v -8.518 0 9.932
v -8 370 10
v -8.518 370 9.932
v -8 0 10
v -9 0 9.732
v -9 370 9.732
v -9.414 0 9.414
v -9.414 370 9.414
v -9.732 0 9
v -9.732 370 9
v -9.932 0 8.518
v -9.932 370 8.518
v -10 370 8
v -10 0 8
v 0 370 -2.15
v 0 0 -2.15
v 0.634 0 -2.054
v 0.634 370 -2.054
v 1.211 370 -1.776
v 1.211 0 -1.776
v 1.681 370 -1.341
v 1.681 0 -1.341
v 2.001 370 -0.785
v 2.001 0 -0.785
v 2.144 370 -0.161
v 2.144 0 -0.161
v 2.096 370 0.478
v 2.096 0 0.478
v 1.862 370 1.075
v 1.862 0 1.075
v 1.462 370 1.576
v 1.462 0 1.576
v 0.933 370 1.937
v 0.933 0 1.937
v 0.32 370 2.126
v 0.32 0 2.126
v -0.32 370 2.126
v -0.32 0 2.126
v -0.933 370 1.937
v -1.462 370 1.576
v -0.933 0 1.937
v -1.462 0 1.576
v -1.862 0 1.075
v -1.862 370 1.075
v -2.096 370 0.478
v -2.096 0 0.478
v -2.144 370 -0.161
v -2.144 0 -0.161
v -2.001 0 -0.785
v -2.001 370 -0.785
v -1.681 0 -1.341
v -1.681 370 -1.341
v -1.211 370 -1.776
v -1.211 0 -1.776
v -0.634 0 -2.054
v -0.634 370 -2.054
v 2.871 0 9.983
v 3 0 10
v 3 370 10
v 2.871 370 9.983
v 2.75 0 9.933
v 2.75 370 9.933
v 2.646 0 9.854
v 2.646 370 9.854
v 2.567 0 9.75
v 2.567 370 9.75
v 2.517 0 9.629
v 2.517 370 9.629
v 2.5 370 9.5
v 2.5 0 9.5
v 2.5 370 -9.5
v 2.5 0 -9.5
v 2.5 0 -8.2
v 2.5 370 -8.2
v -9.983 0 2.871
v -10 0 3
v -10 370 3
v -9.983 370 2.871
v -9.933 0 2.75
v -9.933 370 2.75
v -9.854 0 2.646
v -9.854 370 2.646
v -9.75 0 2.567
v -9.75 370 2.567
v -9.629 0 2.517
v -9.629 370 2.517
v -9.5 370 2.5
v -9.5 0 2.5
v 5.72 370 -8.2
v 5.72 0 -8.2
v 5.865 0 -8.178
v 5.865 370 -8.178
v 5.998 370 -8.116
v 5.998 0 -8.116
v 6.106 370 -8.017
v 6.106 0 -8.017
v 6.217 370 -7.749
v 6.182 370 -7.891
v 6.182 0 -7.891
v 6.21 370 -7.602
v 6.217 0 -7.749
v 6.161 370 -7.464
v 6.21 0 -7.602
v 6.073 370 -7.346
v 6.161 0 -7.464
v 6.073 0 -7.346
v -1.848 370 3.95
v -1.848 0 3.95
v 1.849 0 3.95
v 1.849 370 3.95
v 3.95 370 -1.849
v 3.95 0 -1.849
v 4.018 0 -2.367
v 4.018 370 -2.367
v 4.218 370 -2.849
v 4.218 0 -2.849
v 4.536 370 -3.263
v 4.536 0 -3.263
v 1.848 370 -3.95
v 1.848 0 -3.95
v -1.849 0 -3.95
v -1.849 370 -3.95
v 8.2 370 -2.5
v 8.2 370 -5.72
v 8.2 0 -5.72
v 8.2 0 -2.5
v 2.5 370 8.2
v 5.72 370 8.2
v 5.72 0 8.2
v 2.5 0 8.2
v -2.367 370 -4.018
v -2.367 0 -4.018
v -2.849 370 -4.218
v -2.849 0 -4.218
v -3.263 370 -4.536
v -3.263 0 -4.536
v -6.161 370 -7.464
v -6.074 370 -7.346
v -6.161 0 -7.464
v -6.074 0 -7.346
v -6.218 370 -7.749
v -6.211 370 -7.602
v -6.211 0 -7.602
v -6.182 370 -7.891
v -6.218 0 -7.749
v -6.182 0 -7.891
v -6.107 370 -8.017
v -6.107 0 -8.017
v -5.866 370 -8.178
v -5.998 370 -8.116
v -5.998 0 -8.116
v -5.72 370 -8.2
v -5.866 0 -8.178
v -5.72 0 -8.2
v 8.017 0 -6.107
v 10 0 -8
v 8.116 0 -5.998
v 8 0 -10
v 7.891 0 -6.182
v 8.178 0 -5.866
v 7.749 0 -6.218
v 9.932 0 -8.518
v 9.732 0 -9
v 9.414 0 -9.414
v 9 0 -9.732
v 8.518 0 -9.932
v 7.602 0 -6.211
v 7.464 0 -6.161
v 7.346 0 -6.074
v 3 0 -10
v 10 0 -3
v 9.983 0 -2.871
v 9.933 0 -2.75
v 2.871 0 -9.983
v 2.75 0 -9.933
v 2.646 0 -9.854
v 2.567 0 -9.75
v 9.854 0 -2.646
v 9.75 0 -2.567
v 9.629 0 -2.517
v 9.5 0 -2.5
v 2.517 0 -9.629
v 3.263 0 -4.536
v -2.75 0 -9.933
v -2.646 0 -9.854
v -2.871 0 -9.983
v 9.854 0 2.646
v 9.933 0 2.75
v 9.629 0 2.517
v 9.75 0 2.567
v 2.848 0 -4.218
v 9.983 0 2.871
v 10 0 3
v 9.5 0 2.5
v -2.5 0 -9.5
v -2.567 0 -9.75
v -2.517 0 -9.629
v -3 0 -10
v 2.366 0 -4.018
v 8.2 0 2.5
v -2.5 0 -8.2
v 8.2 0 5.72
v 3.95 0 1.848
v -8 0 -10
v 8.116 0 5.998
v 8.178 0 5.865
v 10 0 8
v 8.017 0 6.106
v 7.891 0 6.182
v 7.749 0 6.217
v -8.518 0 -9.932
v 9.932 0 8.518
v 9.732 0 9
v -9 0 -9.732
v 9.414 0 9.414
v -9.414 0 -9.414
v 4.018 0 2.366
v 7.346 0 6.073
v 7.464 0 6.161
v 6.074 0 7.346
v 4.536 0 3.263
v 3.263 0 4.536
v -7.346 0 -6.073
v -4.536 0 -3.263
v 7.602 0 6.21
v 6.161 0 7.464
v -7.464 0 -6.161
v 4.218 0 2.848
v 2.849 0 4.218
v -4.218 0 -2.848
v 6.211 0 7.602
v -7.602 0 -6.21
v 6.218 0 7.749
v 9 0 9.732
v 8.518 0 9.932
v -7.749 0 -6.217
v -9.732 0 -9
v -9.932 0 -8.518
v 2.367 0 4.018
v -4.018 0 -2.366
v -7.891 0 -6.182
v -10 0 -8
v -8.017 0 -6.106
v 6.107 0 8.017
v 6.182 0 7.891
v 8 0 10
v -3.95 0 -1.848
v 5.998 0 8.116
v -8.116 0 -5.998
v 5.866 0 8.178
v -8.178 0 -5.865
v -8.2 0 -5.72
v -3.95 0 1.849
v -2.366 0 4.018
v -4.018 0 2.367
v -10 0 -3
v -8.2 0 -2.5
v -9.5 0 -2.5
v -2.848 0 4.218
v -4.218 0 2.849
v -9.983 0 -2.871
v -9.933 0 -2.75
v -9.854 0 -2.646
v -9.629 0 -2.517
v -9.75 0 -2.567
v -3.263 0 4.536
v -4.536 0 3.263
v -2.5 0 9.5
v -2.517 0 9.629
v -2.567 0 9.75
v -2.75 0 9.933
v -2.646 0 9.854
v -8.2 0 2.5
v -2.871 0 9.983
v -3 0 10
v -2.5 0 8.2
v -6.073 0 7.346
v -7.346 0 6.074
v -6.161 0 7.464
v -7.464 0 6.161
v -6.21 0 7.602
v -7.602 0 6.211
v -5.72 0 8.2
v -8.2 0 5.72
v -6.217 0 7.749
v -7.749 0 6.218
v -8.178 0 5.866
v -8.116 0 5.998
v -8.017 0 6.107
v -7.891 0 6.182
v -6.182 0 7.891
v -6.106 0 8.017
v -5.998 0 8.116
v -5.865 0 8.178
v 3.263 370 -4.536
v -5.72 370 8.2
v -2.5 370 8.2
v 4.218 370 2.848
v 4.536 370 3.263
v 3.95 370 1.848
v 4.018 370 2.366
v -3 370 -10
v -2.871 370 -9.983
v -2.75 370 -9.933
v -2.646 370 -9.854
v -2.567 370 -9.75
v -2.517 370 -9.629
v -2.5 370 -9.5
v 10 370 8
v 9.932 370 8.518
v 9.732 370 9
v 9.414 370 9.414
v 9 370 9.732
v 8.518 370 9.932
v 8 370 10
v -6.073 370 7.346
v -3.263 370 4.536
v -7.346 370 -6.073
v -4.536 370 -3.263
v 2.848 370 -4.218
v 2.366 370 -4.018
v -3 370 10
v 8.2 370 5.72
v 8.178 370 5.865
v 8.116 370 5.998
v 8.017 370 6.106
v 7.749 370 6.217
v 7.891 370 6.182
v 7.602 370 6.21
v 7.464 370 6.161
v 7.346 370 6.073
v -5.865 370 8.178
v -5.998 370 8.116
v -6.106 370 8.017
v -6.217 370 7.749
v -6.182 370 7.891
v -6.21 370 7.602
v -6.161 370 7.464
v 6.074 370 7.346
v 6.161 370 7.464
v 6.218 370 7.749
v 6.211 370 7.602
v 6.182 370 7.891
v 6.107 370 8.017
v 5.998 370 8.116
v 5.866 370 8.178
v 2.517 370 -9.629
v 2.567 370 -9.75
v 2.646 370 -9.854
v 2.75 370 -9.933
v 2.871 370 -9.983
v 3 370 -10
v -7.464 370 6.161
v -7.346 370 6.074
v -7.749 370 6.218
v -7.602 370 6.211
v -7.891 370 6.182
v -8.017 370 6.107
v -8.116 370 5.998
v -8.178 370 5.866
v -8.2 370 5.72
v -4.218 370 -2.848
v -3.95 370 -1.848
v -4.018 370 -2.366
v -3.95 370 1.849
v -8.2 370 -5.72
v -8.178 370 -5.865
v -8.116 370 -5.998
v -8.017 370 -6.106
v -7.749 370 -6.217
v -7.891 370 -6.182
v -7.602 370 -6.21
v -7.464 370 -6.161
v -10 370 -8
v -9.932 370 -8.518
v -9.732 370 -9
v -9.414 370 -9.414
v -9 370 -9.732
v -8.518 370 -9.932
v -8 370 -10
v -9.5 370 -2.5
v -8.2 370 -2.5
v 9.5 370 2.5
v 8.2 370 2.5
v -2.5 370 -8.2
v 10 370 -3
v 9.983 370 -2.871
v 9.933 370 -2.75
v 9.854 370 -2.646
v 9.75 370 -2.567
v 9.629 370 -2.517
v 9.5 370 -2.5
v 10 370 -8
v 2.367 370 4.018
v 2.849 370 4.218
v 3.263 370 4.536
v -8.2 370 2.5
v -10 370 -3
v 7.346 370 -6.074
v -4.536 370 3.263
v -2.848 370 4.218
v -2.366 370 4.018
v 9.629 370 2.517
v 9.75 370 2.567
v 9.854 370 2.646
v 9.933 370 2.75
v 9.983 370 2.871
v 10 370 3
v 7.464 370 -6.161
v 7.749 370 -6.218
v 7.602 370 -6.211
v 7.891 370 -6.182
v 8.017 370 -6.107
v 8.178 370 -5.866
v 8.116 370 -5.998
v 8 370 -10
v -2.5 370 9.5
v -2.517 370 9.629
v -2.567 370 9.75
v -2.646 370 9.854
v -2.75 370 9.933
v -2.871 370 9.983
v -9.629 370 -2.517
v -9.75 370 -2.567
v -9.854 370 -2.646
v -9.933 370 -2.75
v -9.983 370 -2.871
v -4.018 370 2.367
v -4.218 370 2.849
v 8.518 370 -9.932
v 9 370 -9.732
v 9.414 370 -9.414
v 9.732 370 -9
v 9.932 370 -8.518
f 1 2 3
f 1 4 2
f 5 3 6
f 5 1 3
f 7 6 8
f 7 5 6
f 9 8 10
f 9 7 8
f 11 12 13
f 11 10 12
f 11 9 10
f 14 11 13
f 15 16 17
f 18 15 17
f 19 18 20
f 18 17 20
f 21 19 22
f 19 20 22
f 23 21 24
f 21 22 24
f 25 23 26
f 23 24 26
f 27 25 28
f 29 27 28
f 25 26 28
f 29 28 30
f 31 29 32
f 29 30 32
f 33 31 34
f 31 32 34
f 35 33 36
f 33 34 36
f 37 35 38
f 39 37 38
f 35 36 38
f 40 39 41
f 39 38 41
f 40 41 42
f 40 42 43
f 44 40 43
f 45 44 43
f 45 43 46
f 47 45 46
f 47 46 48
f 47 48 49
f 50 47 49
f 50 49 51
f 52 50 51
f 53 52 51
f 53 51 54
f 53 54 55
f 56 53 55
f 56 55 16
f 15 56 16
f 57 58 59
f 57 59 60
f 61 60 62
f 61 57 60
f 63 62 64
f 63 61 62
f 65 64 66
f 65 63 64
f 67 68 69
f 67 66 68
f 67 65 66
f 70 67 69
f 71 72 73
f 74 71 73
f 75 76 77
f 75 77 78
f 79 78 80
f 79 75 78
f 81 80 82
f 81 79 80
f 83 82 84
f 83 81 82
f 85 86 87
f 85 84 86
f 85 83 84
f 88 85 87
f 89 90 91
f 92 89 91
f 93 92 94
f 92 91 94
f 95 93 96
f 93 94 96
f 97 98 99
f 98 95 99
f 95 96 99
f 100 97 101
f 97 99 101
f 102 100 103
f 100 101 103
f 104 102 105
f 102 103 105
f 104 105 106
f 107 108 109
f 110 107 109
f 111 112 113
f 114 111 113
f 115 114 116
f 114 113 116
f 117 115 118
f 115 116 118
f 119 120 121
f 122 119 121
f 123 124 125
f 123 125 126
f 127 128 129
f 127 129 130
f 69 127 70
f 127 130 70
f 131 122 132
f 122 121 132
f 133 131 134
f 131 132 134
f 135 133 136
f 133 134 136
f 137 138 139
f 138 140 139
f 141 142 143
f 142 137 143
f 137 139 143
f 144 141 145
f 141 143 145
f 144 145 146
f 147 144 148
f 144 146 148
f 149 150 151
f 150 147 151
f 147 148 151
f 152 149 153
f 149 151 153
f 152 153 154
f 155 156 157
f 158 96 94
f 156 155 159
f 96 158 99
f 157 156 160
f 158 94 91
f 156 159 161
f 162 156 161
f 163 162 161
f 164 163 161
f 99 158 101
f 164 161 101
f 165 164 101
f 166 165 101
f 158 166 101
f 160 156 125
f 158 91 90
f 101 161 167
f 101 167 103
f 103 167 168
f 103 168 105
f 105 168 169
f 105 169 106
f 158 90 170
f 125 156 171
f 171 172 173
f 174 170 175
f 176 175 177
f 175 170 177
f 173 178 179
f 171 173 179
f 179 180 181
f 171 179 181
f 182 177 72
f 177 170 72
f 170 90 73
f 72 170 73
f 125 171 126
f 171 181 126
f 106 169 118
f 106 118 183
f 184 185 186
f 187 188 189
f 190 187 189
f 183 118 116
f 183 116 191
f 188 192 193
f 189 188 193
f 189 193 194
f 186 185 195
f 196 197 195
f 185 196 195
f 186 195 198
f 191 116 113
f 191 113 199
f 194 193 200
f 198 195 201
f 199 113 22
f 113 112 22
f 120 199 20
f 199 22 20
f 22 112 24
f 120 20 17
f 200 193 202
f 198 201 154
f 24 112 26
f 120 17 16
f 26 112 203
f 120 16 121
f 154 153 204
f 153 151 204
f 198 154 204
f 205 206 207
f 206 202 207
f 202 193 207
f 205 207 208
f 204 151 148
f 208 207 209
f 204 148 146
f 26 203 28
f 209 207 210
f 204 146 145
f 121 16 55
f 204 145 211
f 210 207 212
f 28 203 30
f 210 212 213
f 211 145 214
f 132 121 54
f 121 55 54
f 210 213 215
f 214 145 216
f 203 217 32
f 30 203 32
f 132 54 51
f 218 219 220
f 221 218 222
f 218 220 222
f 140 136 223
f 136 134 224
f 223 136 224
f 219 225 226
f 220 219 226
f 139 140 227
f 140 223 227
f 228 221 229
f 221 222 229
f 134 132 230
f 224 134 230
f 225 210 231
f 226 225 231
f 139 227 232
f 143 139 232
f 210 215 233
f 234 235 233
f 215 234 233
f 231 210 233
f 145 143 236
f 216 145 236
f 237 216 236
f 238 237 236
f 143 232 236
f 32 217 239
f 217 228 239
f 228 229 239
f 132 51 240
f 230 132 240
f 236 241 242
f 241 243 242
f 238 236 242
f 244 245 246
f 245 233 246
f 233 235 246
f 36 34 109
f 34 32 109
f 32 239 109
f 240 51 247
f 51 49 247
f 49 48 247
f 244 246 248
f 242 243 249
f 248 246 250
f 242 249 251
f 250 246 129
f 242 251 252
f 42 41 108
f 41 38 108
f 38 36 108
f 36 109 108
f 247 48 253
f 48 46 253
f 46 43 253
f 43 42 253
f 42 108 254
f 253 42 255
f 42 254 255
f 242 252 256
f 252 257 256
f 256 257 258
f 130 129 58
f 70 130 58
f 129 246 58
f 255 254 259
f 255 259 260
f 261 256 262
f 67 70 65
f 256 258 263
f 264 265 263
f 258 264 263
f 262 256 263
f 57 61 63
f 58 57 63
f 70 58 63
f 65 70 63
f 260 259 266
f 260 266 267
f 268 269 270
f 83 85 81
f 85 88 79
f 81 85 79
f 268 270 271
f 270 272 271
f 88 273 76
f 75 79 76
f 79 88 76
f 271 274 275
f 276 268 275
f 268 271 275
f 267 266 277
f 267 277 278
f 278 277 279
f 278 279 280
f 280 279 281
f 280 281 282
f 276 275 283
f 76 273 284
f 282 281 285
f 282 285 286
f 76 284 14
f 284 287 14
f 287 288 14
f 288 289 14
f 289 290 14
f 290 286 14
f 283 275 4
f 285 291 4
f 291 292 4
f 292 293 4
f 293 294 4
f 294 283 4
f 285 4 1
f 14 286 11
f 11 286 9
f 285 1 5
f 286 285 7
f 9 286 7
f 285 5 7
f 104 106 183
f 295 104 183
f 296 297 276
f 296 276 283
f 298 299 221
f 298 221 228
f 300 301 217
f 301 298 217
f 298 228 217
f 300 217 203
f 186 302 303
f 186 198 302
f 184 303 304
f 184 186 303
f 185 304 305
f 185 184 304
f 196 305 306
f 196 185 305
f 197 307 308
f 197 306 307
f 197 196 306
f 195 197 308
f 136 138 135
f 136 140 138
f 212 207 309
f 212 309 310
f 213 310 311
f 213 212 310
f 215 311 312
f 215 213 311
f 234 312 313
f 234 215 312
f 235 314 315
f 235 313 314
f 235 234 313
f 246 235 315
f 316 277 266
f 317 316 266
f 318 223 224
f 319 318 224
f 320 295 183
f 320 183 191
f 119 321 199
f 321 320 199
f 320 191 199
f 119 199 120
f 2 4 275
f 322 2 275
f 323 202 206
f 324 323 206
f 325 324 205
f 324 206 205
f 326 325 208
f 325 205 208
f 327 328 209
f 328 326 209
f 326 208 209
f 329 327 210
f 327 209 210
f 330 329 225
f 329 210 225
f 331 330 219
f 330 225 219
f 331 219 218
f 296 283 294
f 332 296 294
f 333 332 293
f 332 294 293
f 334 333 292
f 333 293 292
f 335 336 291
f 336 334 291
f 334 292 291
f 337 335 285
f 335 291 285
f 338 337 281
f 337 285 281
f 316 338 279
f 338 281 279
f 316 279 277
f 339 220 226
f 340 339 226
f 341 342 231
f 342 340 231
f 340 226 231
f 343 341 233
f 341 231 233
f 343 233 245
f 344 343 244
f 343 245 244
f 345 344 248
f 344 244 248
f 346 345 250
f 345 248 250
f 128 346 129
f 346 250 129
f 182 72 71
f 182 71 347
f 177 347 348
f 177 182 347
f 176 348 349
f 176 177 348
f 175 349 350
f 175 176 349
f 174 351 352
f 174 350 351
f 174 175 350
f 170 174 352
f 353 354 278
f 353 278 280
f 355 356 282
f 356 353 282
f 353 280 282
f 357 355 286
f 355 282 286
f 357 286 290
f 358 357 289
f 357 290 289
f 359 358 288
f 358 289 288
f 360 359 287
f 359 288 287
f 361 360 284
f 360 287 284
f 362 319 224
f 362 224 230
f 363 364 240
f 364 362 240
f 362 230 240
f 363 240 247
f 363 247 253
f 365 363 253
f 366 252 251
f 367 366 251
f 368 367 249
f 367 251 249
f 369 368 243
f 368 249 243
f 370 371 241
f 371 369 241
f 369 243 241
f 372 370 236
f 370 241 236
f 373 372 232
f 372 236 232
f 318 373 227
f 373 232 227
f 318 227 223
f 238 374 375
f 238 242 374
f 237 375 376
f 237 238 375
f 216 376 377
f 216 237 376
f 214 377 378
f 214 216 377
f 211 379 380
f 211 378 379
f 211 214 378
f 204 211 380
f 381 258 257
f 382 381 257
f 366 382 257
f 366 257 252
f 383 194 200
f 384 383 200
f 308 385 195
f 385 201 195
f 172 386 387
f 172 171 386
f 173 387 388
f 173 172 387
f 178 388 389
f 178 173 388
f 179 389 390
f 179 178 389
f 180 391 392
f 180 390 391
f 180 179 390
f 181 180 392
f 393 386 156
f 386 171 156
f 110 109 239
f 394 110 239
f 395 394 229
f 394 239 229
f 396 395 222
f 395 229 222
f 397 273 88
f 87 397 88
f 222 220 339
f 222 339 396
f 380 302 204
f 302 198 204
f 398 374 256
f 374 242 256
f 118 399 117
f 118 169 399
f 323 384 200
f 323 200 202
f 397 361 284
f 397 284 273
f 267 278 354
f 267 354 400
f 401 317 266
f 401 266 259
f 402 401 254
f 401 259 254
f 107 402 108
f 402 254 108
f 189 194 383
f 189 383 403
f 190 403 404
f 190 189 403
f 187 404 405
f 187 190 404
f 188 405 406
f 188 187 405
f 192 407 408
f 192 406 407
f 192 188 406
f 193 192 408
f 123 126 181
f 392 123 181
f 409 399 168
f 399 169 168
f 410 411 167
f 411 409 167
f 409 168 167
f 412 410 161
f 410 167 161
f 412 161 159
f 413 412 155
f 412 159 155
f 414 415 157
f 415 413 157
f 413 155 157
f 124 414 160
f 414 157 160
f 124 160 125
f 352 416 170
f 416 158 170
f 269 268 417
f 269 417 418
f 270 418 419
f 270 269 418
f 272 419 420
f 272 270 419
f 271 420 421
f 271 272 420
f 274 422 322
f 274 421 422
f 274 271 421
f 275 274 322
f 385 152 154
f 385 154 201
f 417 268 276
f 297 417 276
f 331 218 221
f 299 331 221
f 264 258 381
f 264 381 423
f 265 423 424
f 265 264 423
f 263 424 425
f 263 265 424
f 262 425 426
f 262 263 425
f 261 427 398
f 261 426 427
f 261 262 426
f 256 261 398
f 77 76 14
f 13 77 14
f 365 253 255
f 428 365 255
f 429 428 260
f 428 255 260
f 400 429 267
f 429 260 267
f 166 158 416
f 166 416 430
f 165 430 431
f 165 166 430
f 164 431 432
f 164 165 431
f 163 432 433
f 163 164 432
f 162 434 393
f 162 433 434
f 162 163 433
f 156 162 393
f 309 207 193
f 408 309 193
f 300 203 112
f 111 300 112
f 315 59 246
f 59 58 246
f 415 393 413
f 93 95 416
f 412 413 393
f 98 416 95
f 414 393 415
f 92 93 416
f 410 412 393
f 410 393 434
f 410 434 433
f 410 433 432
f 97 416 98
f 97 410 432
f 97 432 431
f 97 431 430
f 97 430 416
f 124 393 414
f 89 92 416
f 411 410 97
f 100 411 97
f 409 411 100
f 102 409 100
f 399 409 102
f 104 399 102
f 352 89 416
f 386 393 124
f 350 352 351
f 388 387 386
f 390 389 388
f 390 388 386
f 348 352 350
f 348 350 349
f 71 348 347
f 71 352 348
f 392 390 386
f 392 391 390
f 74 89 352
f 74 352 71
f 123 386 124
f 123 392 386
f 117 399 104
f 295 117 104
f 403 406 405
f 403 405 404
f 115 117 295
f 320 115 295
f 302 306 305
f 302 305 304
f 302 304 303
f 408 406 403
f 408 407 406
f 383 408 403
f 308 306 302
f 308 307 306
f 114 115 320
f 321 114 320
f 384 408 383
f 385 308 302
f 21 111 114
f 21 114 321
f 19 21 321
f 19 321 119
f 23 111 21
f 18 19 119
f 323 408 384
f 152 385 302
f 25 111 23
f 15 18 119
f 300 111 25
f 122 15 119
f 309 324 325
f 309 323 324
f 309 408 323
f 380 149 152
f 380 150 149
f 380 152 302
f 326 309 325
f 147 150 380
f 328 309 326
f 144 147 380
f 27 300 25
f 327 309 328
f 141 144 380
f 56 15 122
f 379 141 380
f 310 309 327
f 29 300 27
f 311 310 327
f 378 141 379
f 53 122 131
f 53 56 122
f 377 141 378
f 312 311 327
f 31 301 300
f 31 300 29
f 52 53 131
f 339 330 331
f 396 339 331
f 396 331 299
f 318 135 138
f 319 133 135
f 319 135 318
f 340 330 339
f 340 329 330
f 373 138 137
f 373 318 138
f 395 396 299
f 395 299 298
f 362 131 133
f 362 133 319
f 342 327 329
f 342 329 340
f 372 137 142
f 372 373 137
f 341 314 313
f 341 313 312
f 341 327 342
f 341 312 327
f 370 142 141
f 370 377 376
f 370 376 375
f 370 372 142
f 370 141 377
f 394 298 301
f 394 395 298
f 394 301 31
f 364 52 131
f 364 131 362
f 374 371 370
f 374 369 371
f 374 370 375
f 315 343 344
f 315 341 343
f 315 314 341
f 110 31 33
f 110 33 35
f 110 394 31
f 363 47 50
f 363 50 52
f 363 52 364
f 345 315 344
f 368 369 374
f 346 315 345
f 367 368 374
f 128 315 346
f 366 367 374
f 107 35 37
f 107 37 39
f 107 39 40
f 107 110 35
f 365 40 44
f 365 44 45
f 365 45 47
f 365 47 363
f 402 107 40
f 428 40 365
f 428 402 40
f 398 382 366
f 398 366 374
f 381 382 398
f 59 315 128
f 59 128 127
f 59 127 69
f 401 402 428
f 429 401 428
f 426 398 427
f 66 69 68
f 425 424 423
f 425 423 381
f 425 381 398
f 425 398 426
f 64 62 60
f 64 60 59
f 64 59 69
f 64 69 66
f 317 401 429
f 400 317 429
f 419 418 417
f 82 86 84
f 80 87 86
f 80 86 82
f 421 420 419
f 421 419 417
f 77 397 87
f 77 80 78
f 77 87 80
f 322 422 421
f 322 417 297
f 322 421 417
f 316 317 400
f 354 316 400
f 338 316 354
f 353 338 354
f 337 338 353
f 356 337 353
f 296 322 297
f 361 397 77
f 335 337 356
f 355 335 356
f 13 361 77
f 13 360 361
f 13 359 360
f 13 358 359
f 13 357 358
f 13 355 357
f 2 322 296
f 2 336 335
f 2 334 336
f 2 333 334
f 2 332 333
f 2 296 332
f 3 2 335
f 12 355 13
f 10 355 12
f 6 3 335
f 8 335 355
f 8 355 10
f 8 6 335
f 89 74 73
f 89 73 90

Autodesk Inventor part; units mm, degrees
ref_plane "YZ Plane" through (0, 0, 0) normal (1, 0, 0) x (0, 1, 0)
ref_plane "XZ Plane" through (0, 0, 0) normal (0, 1, 0) x (-1, 0, 0)
ref_plane "XY Plane" through (0, 0, 0) normal (0, 0, 1) x (1, 0, 0)
sketch "Sketch1" plane through (0, 0, 0) normal (0, 1, 0) x (-1, 0, 0)
  line L0 (8, 10) -> (3, 10)
  line L1 (10, 3) -> (10, 8)
  line L2 (2.5, 9.5) -> (2.5, 8.2)
  line L3 (2.5, 8.2) -> (5.7198, 8.2)
  line L4 (6.0734, 7.3464) -> (3.2627, 4.5358)
  line L5 (1.8485, 3.95) -> (0, 3.95)
  line L6 (0, 3.95) -> (0, 2.15)
  line L7 (0, 2.15) -> (0, 2.15)
  line L8 (2.15, 0) -> (2.15, 0)
  line L9 (2.15, 0) -> (3.95, 0)
  line L10 (8.2, 5.7204) -> (8.2, 2.5)
  line L11 (8.2, 2.5) -> (9.5, 2.5)
  line L12 (0, 29.0836) -> (0, -4.1523) construction
  line L13 (3.95, 0) -> (3.95, 1.8491)
  line L14 (7.3464, 6.0739) -> (4.5358, 3.2633)
  arc A0 (10, 8) -> (8, 10) centre (8, 8) ccw
  arc A1 (8.2, 5.7204) -> (7.3464, 6.0739) centre (7.7, 5.7204) ccw
  arc A2 (6.0734, 7.3464) -> (5.7198, 8.2) centre (5.7198, 7.7) ccw
  arc A3 (4.5358, 3.2633) -> (3.95, 1.8491) centre (5.95, 1.8491) ccw
  arc A4 (1.8485, 3.95) -> (3.2627, 4.5358) centre (1.8485, 5.95) ccw
  arc A5 (2.15, 0) -> (0, 2.15) centre (0, 0) ccw
  arc A6 (3, 10) -> (2.5, 9.5) centre (3, 9.5) ccw
  arc A7 (9.5, 2.5) -> (10, 3) centre (9.5, 3) ccw
  line L15 (18.5462, 0) -> (-9.9601, 0) construction
  line L16 (-3, 10) -> (-8, 10)
  arc A8 (-2.5, 9.5) -> (-3, 10) centre (-3, 9.5) ccw
  line L17 (-2.5, 8.2) -> (-2.5, 9.5)
  line L18 (-5.7204, 8.2) -> (-2.5, 8.2)
  arc A9 (-5.7204, 8.2) -> (-6.0739, 7.3464) centre (-5.7204, 7.7) ccw
  line L19 (-6.0739, 7.3464) -> (-3.2633, 4.5358)
  arc A10 (-3.2633, 4.5358) -> (-1.8491, 3.95) centre (-1.8491, 5.95) ccw
  line L20 (0, 3.95) -> (-1.8491, 3.95)
  line L21 (0, 2.15) -> (0, 3.95)
  arc A11 (0, 2.15) -> (-2.15, 0) centre (0, 0) ccw
  line L22 (-3.95, 0) -> (-2.15, 0)
  line L23 (-3.95, 1.8485) -> (-3.95, 0)
  arc A12 (-3.95, 1.8485) -> (-4.5358, 3.2627) centre (-5.95, 1.8485) ccw
  line L24 (-7.3464, 6.0734) -> (-4.5358, 3.2627)
  arc A13 (-7.3464, 6.0734) -> (-8.2, 5.7198) centre (-7.7, 5.7198) ccw
  line L25 (-8.2, 2.5) -> (-8.2, 5.7198)
  line L26 (-9.5, 2.5) -> (-8.2, 2.5)
  arc A14 (-10, 3) -> (-9.5, 2.5) centre (-9.5, 3) ccw
  line L27 (-10, 8) -> (-10, 3)
  arc A15 (-8, 10) -> (-10, 8) centre (-8, 8) ccw
  line L28 (-10, -3) -> (-10, -8)
  arc A16 (-9.5, -2.5) -> (-10, -3) centre (-9.5, -3) ccw
  line L29 (-8.2, -2.5) -> (-9.5, -2.5)
  line L30 (-8.2, -5.7204) -> (-8.2, -2.5)
  arc A17 (-8.2, -5.7204) -> (-7.3464, -6.0739) centre (-7.7, -5.7204) ccw
  line L31 (-7.3464, -6.0739) -> (-4.5358, -3.2633)
  arc A18 (-4.5358, -3.2633) -> (-3.95, -1.8491) centre (-5.95, -1.8491) ccw
  line L32 (-3.95, 0) -> (-3.95, -1.8491)
  line L33 (-2.15, 0) -> (-3.95, 0)
  arc A19 (-2.15, 0) -> (0, -2.15) centre (0, 0) ccw
  line L34 (0, -3.95) -> (0, -2.15)
  line L35 (-1.8485, -3.95) -> (0, -3.95)
  arc A20 (-1.8485, -3.95) -> (-3.2627, -4.5358) centre (-1.8485, -5.95) ccw
  line L36 (-6.0734, -7.3464) -> (-3.2627, -4.5358)
  arc A21 (-6.0734, -7.3464) -> (-5.7198, -8.2) centre (-5.7198, -7.7) ccw
  line L37 (-2.5, -8.2) -> (-5.7198, -8.2)
  line L38 (-2.5, -9.5) -> (-2.5, -8.2)
  arc A22 (-3, -10) -> (-2.5, -9.5) centre (-3, -9.5) ccw
  line L39 (-8, -10) -> (-3, -10)
  arc A23 (-10, -8) -> (-8, -10) centre (-8, -8) ccw
  line L40 (3, -10) -> (8, -10)
  arc A24 (2.5, -9.5) -> (3, -10) centre (3, -9.5) ccw
  line L41 (2.5, -8.2) -> (2.5, -9.5)
  line L42 (5.7204, -8.2) -> (2.5, -8.2)
  arc A25 (5.7204, -8.2) -> (6.0739, -7.3464) centre (5.7204, -7.7) ccw
  line L43 (6.0739, -7.3464) -> (3.2633, -4.5358)
  arc A26 (3.2633, -4.5358) -> (1.8491, -3.95) centre (1.8491, -5.95) ccw
  line L44 (0, -3.95) -> (1.8491, -3.95)
  line L45 (0, -2.15) -> (0, -3.95)
  arc A27 (0, -2.15) -> (2.15, 0) centre (0, 0) ccw
  line L46 (3.95, 0) -> (2.15, 0)
  line L47 (3.95, -1.8485) -> (3.95, 0)
  arc A28 (3.95, -1.8485) -> (4.5358, -3.2627) centre (5.95, -1.8485) ccw
  line L48 (7.3464, -6.0734) -> (4.5358, -3.2627)
  arc A29 (7.3464, -6.0734) -> (8.2, -5.7198) centre (7.7, -5.7198) ccw
  line L49 (8.2, -2.5) -> (8.2, -5.7198)
  line L50 (9.5, -2.5) -> (8.2, -2.5)
  arc A30 (10, -3) -> (9.5, -2.5) centre (9.5, -3) ccw
  line L51 (10, -8) -> (10, -3)
  arc A31 (8, -10) -> (10, -8) centre (8, -8) ccw
  point P0 (0, 0)
  point P1 (3.95, 2.6775)
  point P2 (-2.6775, 3.95)
  point P3 (0, 0)
  point P4 (-3.95, -2.6775)
  point P5 (0, 0)
  point P6 (2.6775, -3.95)
  point P7 (0, 0)
  dimension "d1" = 2.5
  dimension "d2" = 2.5
  dimension "d3" = 1.8
  dimension "d4" = 1.8
  dimension "d5" = 45
  dimension "d6" = 2.15
  dimension "d7" = 2.15
  dimension "d8" = 1.8
  dimension "d11" = 10
  dimension "d12" = 10
  dimension "d14" = 1.8
  dimension "d15" = 1.8
  dimension "d16" = 2.6775
  dimension "d18" = 2
  dimension "d19" = 0.5
  dimension "d20" = 2
  dimension "d21" = 2.15
  dimension "d22" = 0.5
  dimension "d25" = 360
extrude "Profil_20x20" add sketch "Sketch1" along normal blind 370 contours A0 L1 A7 L11 L10 A1 L14 A3 L13 L9 A5 L6 L5 A4 L4 A2 L3 L2 A6 L0 | L6 A11 L22 L23 A12 L24 A13 L25 L26 A14 L27 A15 L16 A8 L17 L18 A9 L19 A10 L20 | L47 A28 L48 A29 L49 L50 A30 L51 A31 L40 A24 L41 L42 A25 L43 A26 L44 L34 A27 L9 | A19 L34 L35 A20 L36 A21 L37 L38 A22 L39 A23 L28 A16 L29 L30 A17 L31 A18 L32 L22
properties part number "Profil_20x20_370"
